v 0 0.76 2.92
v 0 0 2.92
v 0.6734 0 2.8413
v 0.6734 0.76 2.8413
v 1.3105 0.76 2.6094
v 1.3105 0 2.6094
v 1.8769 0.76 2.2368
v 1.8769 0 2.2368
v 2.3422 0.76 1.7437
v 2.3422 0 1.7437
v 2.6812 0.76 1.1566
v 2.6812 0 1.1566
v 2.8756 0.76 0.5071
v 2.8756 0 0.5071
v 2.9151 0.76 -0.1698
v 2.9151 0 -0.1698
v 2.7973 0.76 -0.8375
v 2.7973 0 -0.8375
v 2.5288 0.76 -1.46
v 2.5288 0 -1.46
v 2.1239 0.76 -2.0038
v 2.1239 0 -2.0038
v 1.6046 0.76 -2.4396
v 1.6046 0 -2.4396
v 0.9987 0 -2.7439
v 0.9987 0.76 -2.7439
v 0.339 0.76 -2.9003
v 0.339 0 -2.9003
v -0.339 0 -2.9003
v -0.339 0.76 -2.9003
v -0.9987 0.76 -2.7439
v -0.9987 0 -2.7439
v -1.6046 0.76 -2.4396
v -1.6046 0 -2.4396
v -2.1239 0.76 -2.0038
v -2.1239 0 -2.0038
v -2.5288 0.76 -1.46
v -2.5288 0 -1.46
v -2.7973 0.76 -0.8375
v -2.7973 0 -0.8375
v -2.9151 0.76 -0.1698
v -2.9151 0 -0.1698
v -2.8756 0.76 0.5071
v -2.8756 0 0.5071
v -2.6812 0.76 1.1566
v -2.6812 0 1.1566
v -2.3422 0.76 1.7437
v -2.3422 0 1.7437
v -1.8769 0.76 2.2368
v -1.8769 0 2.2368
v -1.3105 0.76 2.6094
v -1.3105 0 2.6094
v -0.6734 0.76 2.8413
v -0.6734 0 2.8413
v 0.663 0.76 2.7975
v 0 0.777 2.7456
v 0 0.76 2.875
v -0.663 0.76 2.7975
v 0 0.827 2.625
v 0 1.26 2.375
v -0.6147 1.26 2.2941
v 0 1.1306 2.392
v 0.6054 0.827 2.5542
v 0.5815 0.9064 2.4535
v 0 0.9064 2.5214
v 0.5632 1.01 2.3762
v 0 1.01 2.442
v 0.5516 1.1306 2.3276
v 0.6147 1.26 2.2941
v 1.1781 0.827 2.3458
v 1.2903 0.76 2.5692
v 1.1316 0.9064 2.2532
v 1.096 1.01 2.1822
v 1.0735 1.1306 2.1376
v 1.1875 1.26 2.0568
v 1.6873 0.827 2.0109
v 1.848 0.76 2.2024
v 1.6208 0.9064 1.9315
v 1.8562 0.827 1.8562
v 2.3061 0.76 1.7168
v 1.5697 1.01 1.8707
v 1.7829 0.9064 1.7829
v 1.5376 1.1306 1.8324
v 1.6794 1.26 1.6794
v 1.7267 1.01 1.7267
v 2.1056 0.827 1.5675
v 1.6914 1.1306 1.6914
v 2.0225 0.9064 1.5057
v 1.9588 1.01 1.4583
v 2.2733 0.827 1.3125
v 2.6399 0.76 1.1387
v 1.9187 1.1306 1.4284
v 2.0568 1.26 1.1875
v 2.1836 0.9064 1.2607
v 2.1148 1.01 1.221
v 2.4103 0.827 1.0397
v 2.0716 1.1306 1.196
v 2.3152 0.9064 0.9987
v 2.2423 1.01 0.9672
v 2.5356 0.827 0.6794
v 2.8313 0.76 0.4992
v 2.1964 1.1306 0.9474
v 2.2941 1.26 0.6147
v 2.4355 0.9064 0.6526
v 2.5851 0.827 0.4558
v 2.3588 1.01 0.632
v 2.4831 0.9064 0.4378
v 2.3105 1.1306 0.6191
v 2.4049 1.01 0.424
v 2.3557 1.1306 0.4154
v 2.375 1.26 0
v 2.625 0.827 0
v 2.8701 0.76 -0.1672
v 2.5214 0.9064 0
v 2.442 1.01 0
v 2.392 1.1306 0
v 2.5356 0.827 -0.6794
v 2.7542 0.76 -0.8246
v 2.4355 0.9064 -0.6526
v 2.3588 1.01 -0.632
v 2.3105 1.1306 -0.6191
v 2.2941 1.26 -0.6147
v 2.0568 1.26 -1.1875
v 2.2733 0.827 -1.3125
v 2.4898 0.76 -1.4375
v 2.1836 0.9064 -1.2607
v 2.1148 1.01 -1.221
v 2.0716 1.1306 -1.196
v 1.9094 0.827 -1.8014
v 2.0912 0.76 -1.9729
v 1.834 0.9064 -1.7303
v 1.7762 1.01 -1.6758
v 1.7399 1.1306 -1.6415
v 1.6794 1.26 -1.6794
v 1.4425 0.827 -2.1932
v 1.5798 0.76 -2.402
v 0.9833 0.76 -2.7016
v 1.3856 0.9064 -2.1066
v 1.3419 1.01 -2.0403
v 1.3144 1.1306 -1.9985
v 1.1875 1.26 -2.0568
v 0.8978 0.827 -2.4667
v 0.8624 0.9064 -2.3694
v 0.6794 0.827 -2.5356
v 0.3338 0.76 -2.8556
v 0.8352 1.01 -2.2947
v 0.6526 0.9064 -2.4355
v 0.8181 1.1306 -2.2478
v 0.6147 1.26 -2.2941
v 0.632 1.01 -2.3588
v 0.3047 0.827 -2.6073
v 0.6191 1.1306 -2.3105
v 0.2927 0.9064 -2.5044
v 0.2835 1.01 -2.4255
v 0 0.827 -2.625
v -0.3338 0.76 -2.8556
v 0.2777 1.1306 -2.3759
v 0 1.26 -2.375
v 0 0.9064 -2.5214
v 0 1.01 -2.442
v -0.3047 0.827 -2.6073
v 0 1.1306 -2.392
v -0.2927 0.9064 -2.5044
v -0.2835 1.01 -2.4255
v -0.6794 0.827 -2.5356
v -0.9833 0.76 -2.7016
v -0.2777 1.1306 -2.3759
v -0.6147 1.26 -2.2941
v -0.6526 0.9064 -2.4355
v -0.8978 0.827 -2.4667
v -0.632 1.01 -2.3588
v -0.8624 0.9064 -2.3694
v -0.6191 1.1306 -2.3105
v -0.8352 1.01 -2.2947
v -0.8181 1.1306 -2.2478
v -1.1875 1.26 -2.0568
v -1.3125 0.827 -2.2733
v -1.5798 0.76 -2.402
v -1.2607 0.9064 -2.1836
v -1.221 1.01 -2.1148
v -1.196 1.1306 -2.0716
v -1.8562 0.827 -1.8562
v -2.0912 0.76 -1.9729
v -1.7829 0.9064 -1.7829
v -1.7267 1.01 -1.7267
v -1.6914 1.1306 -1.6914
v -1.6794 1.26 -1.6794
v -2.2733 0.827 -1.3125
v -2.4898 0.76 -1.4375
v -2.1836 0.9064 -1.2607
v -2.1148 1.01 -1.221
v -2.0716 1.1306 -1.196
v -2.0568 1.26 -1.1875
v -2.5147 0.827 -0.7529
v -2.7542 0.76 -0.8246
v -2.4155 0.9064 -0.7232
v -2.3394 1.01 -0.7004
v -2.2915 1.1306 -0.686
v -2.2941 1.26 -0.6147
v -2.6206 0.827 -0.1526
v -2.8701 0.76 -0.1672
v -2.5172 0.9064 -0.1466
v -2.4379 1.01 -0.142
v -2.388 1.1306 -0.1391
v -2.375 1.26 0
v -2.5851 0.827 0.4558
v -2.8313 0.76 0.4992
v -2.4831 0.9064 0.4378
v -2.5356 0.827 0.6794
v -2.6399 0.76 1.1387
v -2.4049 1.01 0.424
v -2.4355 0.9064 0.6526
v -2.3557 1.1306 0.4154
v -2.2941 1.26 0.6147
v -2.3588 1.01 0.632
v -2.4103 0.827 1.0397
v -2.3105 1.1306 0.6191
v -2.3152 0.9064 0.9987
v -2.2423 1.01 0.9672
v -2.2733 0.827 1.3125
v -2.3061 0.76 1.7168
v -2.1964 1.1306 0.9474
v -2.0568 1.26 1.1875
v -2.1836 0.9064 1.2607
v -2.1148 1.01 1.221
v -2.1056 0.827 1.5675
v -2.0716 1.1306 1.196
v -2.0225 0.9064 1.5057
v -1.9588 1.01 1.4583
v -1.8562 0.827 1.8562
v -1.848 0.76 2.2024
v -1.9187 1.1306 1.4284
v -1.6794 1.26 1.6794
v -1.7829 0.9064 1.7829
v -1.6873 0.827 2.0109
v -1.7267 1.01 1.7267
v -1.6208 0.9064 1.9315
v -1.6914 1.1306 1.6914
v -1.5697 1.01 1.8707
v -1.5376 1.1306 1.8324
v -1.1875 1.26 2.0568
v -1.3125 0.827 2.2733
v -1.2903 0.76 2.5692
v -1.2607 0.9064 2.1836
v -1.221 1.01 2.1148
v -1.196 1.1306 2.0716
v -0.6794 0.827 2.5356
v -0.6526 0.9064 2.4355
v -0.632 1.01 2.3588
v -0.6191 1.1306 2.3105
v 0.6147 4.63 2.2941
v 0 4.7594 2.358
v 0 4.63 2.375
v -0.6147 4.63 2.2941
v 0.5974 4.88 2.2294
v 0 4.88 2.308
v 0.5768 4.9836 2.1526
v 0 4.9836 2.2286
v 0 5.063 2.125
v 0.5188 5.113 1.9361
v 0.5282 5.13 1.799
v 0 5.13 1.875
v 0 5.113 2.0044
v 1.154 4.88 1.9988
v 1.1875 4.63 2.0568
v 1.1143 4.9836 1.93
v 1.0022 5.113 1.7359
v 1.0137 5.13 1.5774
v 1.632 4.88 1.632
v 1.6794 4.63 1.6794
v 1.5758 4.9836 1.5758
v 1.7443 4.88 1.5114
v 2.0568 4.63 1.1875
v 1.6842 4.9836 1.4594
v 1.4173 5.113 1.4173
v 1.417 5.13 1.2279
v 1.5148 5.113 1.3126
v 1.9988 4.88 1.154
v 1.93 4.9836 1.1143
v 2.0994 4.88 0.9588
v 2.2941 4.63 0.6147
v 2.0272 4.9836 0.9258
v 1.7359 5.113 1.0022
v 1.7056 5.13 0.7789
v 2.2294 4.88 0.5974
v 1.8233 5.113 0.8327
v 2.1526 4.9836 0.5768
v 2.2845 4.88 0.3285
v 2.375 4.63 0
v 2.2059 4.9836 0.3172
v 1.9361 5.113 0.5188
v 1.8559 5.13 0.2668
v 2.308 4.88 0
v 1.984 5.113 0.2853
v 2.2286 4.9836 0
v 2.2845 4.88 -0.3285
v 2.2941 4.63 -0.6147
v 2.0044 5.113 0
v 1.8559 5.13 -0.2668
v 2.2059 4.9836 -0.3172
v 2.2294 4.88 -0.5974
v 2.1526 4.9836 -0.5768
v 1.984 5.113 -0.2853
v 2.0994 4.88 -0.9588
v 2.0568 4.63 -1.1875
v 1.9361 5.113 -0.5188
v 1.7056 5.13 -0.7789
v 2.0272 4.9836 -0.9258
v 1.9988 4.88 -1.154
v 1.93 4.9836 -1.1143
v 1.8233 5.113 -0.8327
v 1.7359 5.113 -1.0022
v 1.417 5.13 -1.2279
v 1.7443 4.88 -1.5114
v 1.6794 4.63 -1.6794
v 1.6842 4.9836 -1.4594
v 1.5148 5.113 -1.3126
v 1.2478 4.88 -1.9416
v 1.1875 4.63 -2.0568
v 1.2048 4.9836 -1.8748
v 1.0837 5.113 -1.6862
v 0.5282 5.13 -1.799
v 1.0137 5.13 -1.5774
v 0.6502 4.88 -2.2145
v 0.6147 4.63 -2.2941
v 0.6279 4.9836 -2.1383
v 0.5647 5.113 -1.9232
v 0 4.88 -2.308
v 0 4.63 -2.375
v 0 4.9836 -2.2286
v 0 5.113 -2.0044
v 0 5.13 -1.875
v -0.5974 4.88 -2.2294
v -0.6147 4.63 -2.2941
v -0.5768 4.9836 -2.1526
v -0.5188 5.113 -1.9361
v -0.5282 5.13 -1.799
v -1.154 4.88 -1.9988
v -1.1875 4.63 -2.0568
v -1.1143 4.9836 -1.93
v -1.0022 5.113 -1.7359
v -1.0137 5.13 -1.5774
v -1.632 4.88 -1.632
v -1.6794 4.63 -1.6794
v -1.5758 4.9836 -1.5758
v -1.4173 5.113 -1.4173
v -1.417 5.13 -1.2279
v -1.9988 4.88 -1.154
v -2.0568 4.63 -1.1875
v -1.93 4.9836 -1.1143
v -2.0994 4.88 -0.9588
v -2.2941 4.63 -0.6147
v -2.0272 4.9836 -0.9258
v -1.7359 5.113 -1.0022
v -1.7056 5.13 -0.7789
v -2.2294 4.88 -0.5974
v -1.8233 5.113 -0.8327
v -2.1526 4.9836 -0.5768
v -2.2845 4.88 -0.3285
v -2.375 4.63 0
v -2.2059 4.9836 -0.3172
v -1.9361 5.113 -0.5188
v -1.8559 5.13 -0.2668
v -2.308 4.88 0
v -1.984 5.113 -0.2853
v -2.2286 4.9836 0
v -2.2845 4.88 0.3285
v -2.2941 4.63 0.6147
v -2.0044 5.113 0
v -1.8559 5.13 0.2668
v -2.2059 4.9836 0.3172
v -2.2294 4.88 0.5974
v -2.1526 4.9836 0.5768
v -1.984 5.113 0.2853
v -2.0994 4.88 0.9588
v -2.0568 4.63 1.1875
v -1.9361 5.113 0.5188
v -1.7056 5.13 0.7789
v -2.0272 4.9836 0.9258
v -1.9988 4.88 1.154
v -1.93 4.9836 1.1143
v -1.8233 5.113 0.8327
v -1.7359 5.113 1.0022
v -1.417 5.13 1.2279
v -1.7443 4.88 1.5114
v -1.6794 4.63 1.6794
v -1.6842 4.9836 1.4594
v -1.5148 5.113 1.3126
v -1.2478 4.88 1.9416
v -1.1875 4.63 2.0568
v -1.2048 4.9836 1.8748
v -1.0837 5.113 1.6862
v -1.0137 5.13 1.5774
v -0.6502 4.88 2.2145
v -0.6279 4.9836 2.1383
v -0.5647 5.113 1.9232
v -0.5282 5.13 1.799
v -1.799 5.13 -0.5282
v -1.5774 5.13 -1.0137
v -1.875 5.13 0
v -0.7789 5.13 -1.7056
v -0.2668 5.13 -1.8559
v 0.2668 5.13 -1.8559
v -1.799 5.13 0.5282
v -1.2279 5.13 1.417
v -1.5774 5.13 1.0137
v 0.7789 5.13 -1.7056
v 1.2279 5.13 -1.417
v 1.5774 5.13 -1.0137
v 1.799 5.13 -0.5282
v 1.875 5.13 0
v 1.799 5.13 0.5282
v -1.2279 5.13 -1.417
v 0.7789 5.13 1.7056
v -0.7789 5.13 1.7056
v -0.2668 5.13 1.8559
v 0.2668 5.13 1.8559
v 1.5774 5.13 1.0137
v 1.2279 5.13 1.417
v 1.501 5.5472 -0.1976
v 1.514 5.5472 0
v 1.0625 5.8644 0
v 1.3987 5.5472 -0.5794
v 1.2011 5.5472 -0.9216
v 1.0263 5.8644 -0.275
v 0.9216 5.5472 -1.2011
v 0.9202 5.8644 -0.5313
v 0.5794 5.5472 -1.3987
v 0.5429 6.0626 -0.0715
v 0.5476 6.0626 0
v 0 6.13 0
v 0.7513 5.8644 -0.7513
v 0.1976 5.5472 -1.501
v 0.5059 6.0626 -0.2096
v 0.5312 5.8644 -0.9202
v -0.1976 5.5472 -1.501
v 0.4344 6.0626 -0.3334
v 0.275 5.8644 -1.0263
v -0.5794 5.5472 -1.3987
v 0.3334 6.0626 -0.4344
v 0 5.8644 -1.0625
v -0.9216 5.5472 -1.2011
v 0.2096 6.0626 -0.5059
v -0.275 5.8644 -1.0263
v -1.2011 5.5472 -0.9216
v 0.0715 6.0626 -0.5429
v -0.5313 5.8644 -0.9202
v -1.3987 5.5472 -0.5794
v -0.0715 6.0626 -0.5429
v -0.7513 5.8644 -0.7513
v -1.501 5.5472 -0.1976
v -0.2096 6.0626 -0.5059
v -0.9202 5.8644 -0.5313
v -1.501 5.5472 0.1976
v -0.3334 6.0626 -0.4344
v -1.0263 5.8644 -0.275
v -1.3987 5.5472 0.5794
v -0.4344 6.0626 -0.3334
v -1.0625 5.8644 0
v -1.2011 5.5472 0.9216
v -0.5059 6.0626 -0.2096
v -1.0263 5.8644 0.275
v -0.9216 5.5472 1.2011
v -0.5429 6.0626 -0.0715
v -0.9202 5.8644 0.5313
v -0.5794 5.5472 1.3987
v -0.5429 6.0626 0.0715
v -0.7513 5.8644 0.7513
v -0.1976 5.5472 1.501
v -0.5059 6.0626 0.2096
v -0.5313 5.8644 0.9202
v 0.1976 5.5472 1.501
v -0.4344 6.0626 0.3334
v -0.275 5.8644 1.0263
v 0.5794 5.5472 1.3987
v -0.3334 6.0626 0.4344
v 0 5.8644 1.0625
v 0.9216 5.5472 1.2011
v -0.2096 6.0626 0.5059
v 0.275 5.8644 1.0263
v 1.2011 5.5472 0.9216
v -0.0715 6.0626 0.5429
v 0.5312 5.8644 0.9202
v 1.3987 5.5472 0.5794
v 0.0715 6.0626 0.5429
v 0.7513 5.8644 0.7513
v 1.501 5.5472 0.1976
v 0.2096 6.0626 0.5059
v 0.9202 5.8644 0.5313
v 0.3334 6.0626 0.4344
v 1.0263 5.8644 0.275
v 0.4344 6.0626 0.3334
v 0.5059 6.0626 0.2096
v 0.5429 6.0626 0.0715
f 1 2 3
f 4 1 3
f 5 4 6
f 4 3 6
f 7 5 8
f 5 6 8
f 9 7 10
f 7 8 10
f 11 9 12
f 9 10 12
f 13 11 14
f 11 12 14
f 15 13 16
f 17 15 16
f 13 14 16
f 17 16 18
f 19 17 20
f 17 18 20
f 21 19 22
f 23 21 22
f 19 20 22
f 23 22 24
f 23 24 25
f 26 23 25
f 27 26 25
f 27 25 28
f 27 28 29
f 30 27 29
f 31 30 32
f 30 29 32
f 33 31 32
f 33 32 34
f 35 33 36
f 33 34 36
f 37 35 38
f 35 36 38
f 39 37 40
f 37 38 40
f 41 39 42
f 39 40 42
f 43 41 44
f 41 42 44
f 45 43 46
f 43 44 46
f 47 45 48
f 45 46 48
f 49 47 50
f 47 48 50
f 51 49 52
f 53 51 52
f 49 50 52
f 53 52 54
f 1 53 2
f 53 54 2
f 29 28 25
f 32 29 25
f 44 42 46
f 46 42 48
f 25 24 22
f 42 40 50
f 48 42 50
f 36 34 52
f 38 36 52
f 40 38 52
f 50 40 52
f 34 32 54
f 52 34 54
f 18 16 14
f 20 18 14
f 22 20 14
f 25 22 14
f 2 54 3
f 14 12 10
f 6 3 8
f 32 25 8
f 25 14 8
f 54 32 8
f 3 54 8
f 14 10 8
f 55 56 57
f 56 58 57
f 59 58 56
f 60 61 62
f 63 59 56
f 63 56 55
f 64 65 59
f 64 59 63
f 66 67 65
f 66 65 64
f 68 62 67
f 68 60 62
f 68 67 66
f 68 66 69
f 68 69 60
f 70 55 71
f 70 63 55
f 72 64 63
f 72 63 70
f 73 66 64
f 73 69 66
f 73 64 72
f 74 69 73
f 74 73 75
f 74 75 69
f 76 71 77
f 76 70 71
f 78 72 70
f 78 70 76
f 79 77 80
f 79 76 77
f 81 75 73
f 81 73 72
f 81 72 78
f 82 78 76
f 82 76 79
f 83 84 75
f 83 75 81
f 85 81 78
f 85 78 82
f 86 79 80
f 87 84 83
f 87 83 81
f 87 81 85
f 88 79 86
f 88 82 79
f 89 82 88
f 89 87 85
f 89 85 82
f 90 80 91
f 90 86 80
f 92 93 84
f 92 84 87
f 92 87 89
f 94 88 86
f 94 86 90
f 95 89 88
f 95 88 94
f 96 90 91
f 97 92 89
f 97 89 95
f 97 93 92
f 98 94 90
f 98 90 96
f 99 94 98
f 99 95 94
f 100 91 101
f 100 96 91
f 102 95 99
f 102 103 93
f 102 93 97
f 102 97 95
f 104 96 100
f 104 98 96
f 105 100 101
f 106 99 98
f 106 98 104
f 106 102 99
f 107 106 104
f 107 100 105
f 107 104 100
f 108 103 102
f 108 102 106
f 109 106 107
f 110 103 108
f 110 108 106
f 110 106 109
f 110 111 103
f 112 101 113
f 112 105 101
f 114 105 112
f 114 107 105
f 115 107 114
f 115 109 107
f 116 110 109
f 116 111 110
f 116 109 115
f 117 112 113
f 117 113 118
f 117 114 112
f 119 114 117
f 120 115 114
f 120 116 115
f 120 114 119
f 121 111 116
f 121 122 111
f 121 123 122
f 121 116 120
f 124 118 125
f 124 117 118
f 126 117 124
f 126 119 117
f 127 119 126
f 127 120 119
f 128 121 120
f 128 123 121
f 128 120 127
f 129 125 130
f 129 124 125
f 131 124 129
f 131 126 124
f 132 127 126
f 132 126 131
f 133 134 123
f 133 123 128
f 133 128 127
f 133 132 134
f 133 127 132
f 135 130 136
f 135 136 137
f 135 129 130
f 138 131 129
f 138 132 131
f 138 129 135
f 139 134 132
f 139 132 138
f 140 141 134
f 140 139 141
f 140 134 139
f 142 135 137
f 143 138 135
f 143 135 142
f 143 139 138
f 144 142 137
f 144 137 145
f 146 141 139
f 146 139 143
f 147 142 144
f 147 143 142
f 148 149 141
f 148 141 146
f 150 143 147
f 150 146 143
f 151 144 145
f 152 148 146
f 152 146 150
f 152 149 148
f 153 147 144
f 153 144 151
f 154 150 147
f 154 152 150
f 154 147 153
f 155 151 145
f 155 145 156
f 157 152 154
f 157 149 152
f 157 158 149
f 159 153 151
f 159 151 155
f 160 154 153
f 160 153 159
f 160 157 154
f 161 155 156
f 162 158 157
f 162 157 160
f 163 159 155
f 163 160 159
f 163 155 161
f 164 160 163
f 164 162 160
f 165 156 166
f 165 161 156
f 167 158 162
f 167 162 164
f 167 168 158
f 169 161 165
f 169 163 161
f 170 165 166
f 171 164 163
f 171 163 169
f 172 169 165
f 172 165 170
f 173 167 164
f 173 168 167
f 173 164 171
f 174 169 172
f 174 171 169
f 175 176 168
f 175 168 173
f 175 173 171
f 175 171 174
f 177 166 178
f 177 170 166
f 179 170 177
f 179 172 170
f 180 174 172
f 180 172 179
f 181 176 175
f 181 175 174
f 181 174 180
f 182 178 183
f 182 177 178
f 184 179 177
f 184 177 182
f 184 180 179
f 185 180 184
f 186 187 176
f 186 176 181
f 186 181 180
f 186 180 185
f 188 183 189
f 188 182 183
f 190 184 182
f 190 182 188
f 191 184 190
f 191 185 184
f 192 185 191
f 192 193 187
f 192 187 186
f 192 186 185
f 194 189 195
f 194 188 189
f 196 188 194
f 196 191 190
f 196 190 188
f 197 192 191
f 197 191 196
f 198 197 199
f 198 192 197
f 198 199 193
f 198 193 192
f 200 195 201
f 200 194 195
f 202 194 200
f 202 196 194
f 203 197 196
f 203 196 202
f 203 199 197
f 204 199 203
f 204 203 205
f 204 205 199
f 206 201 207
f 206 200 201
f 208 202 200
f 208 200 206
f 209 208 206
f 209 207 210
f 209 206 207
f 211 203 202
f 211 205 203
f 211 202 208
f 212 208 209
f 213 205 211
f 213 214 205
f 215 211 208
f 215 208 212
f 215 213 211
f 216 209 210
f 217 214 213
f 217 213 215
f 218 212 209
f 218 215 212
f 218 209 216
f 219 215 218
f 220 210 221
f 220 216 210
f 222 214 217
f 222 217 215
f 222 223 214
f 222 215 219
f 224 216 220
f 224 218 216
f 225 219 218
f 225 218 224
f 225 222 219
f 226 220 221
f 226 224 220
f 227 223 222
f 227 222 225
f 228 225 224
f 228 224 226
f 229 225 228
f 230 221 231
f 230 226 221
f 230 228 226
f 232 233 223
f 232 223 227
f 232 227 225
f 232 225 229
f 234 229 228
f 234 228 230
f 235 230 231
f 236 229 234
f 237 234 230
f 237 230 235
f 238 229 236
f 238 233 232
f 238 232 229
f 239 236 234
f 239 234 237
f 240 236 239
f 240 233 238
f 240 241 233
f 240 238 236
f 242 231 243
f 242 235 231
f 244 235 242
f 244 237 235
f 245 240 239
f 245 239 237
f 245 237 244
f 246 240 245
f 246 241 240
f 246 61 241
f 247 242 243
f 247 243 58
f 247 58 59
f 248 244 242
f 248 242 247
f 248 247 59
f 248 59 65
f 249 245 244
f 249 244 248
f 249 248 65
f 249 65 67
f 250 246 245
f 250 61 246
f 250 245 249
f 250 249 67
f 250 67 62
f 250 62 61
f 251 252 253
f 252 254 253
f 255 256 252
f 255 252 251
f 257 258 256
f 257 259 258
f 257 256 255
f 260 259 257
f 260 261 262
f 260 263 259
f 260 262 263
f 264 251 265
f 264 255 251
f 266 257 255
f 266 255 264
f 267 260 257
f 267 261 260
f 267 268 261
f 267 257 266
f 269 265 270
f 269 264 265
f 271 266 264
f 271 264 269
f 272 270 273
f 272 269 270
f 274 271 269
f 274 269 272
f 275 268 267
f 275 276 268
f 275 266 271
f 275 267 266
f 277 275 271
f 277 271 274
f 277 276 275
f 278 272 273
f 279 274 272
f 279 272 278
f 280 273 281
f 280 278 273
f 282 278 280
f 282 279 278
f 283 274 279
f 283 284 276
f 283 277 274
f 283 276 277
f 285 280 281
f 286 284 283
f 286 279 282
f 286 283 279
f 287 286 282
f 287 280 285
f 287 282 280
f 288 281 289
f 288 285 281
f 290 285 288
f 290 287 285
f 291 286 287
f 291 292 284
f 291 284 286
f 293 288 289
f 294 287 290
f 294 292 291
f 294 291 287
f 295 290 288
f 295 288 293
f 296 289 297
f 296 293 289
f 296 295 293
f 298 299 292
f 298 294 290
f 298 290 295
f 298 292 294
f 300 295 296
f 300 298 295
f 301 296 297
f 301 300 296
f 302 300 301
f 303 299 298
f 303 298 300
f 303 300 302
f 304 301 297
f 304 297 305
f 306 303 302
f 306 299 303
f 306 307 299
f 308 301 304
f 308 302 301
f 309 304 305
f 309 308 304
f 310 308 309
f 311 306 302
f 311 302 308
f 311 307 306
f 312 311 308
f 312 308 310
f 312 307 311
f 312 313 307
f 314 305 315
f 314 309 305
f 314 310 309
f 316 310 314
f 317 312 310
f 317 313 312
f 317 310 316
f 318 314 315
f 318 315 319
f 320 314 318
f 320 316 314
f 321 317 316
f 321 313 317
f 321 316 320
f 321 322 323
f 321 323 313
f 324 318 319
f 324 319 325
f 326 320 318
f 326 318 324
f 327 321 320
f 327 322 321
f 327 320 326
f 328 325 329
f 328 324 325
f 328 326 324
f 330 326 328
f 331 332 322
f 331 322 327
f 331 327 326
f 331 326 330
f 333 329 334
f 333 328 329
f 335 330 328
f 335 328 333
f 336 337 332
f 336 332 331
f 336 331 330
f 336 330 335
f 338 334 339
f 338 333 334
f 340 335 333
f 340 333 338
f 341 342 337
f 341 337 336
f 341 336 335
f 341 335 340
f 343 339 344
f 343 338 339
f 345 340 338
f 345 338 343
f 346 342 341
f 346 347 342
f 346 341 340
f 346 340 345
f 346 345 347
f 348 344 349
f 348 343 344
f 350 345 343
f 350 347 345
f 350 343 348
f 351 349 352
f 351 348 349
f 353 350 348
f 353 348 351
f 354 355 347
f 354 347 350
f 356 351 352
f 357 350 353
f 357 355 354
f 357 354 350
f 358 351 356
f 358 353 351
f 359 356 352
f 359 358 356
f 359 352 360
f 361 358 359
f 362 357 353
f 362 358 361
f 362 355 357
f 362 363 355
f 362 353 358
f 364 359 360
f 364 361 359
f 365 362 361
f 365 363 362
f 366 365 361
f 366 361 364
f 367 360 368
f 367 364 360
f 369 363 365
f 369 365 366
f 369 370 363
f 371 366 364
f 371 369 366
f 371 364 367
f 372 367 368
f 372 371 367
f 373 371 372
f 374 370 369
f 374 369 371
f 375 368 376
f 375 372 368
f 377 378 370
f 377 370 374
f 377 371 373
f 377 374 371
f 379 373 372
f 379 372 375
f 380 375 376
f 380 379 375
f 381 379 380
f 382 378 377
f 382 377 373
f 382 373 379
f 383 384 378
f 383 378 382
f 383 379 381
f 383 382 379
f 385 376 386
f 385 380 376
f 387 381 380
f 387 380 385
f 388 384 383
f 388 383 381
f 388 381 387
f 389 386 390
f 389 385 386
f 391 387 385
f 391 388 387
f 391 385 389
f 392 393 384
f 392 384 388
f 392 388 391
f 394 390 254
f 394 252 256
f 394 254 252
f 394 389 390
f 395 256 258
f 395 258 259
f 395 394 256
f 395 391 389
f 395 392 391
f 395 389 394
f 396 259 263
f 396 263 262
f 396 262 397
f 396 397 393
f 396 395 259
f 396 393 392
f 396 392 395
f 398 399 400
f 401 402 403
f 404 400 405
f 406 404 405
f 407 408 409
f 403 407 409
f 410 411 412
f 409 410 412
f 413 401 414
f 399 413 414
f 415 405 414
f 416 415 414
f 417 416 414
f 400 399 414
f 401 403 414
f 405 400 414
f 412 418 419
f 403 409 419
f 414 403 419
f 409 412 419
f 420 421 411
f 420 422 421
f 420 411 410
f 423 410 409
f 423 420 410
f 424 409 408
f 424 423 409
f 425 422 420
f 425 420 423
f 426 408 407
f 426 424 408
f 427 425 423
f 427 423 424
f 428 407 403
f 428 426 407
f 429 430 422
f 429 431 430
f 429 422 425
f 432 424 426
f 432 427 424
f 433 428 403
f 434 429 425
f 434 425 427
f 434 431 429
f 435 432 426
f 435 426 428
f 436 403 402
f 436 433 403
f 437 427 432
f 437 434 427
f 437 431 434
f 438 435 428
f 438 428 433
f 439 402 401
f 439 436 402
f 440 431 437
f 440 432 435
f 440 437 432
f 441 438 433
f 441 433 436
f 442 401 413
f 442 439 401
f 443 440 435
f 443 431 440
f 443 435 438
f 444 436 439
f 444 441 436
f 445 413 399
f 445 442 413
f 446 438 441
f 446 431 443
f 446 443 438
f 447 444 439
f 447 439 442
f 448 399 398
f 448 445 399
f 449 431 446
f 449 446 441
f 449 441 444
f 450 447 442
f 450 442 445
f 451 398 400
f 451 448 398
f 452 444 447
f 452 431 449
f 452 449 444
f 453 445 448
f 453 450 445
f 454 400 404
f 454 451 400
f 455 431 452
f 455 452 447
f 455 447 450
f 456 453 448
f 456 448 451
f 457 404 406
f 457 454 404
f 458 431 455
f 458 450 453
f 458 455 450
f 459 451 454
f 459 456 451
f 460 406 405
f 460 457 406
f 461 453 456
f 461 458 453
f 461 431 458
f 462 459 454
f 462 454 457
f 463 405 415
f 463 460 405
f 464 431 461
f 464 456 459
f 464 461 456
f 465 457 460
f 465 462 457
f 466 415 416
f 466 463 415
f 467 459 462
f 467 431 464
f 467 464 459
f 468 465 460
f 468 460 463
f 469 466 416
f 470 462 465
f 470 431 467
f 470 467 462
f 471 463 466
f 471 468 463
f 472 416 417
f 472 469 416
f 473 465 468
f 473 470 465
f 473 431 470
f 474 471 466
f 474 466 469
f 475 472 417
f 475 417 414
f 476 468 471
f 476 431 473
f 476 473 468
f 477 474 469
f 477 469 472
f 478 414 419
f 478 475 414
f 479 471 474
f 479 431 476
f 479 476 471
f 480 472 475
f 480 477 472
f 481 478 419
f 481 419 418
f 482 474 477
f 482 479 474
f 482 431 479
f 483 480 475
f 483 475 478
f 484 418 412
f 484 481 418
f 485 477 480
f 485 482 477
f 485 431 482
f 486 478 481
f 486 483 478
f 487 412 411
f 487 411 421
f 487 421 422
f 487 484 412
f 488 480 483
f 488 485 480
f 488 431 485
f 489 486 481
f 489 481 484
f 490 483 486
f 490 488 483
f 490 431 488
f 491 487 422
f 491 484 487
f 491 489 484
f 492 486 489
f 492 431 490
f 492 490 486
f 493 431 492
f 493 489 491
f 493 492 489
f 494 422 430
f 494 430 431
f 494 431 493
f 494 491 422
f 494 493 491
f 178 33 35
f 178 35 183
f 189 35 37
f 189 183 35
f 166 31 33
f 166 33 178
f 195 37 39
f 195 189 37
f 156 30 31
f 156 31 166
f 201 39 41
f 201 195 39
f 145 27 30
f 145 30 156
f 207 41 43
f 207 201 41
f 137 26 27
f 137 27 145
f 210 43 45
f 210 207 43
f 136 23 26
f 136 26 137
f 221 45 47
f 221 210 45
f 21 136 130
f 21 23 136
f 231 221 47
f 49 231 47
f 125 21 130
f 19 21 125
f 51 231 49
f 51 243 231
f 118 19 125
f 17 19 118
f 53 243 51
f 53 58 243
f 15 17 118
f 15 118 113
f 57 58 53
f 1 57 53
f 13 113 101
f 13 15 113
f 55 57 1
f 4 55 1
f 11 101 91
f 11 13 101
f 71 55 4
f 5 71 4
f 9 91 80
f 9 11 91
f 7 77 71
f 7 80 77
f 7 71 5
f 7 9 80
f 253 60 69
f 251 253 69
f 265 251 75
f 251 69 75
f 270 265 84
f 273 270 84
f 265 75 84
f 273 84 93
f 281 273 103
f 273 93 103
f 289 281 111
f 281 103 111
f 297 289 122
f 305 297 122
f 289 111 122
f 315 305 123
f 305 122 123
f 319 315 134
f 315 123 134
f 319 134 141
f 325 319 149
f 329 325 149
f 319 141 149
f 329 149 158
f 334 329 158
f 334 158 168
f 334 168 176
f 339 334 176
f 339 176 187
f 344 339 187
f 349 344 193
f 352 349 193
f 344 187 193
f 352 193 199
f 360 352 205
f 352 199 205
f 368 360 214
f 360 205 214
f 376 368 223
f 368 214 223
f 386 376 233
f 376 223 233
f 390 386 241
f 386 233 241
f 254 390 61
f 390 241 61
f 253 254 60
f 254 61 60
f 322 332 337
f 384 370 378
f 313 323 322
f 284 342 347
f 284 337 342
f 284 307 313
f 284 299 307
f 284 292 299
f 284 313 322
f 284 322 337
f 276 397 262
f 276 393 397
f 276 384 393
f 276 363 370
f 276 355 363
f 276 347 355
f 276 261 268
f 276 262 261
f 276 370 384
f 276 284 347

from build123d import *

# Parameters (mm, degrees)
SKETCH1_R           = 2.92
BOSS_EXTRUDE1_DEPTH = 0.76
SKETCH3_R           = 2.375
BOSS_EXTRUDE2_DEPTH = 4.37
FILLET1_R           = 0.5


# Read off the part's stored shape, not the designer's step: Dome1
with BuildPart() as part:
    # Sketch1 → Boss-Extrude1 (new body)
    with BuildSketch(Plane(origin=(0, 0, 0), x_dir=(1, 0, 0), z_dir=(0, 1, 0))):
        with Locations(Location((0, 0, 0), (0, 0, 270))):
            Circle(SKETCH1_R)
    extrude(amount=BOSS_EXTRUDE1_DEPTH)

    # Sketch3 → Boss-Extrude2 (add)
    with BuildSketch(Plane(origin=(0, 0.76, 0), x_dir=(1, 0, 0), z_dir=(0, 1, 0))):
        with Locations(Location((0, 0, 0), (0, 0, 270))):
            Circle(SKETCH3_R)
    extrude(amount=BOSS_EXTRUDE2_DEPTH)

    # Fillet1
    fillet1_edges = [part.edges().sort_by_distance(p)[0] for p in [
        (0, 0.76, -2.375),
        (0, 5.13, -2.375),
    ]]
    fillet(fillet1_edges, radius=FILLET1_R)

    # Dome1 outline → Dome1 (revolve)
    with BuildSketch(Plane.XY):
        with BuildLine():
            Line((0, 5.13), (1.875000001, 5.129999998))
            ThreePointArc((1.875000001, 5.129999998), (1.062500001, 5.864374999), (0, 6.13))
            Line((0, 6.13), (0, 5.13))
        make_face()
    revolve(axis=Axis((0, 0, 0), (0, 1, 0)))


with BuildPart() as body_2:
    # Split1: the piece on the far side of the plane
    add(part.part)
    split(bisect_by=Plane.ZX.offset(5.13), keep=Keep.BOTTOM)


with BuildPart() as part_1:
    add(part.part)

    # Split1
    split(bisect_by=Plane.ZX.offset(5.13), keep=Keep.TOP)


solid = Compound([body_2.part, part_1.part])
